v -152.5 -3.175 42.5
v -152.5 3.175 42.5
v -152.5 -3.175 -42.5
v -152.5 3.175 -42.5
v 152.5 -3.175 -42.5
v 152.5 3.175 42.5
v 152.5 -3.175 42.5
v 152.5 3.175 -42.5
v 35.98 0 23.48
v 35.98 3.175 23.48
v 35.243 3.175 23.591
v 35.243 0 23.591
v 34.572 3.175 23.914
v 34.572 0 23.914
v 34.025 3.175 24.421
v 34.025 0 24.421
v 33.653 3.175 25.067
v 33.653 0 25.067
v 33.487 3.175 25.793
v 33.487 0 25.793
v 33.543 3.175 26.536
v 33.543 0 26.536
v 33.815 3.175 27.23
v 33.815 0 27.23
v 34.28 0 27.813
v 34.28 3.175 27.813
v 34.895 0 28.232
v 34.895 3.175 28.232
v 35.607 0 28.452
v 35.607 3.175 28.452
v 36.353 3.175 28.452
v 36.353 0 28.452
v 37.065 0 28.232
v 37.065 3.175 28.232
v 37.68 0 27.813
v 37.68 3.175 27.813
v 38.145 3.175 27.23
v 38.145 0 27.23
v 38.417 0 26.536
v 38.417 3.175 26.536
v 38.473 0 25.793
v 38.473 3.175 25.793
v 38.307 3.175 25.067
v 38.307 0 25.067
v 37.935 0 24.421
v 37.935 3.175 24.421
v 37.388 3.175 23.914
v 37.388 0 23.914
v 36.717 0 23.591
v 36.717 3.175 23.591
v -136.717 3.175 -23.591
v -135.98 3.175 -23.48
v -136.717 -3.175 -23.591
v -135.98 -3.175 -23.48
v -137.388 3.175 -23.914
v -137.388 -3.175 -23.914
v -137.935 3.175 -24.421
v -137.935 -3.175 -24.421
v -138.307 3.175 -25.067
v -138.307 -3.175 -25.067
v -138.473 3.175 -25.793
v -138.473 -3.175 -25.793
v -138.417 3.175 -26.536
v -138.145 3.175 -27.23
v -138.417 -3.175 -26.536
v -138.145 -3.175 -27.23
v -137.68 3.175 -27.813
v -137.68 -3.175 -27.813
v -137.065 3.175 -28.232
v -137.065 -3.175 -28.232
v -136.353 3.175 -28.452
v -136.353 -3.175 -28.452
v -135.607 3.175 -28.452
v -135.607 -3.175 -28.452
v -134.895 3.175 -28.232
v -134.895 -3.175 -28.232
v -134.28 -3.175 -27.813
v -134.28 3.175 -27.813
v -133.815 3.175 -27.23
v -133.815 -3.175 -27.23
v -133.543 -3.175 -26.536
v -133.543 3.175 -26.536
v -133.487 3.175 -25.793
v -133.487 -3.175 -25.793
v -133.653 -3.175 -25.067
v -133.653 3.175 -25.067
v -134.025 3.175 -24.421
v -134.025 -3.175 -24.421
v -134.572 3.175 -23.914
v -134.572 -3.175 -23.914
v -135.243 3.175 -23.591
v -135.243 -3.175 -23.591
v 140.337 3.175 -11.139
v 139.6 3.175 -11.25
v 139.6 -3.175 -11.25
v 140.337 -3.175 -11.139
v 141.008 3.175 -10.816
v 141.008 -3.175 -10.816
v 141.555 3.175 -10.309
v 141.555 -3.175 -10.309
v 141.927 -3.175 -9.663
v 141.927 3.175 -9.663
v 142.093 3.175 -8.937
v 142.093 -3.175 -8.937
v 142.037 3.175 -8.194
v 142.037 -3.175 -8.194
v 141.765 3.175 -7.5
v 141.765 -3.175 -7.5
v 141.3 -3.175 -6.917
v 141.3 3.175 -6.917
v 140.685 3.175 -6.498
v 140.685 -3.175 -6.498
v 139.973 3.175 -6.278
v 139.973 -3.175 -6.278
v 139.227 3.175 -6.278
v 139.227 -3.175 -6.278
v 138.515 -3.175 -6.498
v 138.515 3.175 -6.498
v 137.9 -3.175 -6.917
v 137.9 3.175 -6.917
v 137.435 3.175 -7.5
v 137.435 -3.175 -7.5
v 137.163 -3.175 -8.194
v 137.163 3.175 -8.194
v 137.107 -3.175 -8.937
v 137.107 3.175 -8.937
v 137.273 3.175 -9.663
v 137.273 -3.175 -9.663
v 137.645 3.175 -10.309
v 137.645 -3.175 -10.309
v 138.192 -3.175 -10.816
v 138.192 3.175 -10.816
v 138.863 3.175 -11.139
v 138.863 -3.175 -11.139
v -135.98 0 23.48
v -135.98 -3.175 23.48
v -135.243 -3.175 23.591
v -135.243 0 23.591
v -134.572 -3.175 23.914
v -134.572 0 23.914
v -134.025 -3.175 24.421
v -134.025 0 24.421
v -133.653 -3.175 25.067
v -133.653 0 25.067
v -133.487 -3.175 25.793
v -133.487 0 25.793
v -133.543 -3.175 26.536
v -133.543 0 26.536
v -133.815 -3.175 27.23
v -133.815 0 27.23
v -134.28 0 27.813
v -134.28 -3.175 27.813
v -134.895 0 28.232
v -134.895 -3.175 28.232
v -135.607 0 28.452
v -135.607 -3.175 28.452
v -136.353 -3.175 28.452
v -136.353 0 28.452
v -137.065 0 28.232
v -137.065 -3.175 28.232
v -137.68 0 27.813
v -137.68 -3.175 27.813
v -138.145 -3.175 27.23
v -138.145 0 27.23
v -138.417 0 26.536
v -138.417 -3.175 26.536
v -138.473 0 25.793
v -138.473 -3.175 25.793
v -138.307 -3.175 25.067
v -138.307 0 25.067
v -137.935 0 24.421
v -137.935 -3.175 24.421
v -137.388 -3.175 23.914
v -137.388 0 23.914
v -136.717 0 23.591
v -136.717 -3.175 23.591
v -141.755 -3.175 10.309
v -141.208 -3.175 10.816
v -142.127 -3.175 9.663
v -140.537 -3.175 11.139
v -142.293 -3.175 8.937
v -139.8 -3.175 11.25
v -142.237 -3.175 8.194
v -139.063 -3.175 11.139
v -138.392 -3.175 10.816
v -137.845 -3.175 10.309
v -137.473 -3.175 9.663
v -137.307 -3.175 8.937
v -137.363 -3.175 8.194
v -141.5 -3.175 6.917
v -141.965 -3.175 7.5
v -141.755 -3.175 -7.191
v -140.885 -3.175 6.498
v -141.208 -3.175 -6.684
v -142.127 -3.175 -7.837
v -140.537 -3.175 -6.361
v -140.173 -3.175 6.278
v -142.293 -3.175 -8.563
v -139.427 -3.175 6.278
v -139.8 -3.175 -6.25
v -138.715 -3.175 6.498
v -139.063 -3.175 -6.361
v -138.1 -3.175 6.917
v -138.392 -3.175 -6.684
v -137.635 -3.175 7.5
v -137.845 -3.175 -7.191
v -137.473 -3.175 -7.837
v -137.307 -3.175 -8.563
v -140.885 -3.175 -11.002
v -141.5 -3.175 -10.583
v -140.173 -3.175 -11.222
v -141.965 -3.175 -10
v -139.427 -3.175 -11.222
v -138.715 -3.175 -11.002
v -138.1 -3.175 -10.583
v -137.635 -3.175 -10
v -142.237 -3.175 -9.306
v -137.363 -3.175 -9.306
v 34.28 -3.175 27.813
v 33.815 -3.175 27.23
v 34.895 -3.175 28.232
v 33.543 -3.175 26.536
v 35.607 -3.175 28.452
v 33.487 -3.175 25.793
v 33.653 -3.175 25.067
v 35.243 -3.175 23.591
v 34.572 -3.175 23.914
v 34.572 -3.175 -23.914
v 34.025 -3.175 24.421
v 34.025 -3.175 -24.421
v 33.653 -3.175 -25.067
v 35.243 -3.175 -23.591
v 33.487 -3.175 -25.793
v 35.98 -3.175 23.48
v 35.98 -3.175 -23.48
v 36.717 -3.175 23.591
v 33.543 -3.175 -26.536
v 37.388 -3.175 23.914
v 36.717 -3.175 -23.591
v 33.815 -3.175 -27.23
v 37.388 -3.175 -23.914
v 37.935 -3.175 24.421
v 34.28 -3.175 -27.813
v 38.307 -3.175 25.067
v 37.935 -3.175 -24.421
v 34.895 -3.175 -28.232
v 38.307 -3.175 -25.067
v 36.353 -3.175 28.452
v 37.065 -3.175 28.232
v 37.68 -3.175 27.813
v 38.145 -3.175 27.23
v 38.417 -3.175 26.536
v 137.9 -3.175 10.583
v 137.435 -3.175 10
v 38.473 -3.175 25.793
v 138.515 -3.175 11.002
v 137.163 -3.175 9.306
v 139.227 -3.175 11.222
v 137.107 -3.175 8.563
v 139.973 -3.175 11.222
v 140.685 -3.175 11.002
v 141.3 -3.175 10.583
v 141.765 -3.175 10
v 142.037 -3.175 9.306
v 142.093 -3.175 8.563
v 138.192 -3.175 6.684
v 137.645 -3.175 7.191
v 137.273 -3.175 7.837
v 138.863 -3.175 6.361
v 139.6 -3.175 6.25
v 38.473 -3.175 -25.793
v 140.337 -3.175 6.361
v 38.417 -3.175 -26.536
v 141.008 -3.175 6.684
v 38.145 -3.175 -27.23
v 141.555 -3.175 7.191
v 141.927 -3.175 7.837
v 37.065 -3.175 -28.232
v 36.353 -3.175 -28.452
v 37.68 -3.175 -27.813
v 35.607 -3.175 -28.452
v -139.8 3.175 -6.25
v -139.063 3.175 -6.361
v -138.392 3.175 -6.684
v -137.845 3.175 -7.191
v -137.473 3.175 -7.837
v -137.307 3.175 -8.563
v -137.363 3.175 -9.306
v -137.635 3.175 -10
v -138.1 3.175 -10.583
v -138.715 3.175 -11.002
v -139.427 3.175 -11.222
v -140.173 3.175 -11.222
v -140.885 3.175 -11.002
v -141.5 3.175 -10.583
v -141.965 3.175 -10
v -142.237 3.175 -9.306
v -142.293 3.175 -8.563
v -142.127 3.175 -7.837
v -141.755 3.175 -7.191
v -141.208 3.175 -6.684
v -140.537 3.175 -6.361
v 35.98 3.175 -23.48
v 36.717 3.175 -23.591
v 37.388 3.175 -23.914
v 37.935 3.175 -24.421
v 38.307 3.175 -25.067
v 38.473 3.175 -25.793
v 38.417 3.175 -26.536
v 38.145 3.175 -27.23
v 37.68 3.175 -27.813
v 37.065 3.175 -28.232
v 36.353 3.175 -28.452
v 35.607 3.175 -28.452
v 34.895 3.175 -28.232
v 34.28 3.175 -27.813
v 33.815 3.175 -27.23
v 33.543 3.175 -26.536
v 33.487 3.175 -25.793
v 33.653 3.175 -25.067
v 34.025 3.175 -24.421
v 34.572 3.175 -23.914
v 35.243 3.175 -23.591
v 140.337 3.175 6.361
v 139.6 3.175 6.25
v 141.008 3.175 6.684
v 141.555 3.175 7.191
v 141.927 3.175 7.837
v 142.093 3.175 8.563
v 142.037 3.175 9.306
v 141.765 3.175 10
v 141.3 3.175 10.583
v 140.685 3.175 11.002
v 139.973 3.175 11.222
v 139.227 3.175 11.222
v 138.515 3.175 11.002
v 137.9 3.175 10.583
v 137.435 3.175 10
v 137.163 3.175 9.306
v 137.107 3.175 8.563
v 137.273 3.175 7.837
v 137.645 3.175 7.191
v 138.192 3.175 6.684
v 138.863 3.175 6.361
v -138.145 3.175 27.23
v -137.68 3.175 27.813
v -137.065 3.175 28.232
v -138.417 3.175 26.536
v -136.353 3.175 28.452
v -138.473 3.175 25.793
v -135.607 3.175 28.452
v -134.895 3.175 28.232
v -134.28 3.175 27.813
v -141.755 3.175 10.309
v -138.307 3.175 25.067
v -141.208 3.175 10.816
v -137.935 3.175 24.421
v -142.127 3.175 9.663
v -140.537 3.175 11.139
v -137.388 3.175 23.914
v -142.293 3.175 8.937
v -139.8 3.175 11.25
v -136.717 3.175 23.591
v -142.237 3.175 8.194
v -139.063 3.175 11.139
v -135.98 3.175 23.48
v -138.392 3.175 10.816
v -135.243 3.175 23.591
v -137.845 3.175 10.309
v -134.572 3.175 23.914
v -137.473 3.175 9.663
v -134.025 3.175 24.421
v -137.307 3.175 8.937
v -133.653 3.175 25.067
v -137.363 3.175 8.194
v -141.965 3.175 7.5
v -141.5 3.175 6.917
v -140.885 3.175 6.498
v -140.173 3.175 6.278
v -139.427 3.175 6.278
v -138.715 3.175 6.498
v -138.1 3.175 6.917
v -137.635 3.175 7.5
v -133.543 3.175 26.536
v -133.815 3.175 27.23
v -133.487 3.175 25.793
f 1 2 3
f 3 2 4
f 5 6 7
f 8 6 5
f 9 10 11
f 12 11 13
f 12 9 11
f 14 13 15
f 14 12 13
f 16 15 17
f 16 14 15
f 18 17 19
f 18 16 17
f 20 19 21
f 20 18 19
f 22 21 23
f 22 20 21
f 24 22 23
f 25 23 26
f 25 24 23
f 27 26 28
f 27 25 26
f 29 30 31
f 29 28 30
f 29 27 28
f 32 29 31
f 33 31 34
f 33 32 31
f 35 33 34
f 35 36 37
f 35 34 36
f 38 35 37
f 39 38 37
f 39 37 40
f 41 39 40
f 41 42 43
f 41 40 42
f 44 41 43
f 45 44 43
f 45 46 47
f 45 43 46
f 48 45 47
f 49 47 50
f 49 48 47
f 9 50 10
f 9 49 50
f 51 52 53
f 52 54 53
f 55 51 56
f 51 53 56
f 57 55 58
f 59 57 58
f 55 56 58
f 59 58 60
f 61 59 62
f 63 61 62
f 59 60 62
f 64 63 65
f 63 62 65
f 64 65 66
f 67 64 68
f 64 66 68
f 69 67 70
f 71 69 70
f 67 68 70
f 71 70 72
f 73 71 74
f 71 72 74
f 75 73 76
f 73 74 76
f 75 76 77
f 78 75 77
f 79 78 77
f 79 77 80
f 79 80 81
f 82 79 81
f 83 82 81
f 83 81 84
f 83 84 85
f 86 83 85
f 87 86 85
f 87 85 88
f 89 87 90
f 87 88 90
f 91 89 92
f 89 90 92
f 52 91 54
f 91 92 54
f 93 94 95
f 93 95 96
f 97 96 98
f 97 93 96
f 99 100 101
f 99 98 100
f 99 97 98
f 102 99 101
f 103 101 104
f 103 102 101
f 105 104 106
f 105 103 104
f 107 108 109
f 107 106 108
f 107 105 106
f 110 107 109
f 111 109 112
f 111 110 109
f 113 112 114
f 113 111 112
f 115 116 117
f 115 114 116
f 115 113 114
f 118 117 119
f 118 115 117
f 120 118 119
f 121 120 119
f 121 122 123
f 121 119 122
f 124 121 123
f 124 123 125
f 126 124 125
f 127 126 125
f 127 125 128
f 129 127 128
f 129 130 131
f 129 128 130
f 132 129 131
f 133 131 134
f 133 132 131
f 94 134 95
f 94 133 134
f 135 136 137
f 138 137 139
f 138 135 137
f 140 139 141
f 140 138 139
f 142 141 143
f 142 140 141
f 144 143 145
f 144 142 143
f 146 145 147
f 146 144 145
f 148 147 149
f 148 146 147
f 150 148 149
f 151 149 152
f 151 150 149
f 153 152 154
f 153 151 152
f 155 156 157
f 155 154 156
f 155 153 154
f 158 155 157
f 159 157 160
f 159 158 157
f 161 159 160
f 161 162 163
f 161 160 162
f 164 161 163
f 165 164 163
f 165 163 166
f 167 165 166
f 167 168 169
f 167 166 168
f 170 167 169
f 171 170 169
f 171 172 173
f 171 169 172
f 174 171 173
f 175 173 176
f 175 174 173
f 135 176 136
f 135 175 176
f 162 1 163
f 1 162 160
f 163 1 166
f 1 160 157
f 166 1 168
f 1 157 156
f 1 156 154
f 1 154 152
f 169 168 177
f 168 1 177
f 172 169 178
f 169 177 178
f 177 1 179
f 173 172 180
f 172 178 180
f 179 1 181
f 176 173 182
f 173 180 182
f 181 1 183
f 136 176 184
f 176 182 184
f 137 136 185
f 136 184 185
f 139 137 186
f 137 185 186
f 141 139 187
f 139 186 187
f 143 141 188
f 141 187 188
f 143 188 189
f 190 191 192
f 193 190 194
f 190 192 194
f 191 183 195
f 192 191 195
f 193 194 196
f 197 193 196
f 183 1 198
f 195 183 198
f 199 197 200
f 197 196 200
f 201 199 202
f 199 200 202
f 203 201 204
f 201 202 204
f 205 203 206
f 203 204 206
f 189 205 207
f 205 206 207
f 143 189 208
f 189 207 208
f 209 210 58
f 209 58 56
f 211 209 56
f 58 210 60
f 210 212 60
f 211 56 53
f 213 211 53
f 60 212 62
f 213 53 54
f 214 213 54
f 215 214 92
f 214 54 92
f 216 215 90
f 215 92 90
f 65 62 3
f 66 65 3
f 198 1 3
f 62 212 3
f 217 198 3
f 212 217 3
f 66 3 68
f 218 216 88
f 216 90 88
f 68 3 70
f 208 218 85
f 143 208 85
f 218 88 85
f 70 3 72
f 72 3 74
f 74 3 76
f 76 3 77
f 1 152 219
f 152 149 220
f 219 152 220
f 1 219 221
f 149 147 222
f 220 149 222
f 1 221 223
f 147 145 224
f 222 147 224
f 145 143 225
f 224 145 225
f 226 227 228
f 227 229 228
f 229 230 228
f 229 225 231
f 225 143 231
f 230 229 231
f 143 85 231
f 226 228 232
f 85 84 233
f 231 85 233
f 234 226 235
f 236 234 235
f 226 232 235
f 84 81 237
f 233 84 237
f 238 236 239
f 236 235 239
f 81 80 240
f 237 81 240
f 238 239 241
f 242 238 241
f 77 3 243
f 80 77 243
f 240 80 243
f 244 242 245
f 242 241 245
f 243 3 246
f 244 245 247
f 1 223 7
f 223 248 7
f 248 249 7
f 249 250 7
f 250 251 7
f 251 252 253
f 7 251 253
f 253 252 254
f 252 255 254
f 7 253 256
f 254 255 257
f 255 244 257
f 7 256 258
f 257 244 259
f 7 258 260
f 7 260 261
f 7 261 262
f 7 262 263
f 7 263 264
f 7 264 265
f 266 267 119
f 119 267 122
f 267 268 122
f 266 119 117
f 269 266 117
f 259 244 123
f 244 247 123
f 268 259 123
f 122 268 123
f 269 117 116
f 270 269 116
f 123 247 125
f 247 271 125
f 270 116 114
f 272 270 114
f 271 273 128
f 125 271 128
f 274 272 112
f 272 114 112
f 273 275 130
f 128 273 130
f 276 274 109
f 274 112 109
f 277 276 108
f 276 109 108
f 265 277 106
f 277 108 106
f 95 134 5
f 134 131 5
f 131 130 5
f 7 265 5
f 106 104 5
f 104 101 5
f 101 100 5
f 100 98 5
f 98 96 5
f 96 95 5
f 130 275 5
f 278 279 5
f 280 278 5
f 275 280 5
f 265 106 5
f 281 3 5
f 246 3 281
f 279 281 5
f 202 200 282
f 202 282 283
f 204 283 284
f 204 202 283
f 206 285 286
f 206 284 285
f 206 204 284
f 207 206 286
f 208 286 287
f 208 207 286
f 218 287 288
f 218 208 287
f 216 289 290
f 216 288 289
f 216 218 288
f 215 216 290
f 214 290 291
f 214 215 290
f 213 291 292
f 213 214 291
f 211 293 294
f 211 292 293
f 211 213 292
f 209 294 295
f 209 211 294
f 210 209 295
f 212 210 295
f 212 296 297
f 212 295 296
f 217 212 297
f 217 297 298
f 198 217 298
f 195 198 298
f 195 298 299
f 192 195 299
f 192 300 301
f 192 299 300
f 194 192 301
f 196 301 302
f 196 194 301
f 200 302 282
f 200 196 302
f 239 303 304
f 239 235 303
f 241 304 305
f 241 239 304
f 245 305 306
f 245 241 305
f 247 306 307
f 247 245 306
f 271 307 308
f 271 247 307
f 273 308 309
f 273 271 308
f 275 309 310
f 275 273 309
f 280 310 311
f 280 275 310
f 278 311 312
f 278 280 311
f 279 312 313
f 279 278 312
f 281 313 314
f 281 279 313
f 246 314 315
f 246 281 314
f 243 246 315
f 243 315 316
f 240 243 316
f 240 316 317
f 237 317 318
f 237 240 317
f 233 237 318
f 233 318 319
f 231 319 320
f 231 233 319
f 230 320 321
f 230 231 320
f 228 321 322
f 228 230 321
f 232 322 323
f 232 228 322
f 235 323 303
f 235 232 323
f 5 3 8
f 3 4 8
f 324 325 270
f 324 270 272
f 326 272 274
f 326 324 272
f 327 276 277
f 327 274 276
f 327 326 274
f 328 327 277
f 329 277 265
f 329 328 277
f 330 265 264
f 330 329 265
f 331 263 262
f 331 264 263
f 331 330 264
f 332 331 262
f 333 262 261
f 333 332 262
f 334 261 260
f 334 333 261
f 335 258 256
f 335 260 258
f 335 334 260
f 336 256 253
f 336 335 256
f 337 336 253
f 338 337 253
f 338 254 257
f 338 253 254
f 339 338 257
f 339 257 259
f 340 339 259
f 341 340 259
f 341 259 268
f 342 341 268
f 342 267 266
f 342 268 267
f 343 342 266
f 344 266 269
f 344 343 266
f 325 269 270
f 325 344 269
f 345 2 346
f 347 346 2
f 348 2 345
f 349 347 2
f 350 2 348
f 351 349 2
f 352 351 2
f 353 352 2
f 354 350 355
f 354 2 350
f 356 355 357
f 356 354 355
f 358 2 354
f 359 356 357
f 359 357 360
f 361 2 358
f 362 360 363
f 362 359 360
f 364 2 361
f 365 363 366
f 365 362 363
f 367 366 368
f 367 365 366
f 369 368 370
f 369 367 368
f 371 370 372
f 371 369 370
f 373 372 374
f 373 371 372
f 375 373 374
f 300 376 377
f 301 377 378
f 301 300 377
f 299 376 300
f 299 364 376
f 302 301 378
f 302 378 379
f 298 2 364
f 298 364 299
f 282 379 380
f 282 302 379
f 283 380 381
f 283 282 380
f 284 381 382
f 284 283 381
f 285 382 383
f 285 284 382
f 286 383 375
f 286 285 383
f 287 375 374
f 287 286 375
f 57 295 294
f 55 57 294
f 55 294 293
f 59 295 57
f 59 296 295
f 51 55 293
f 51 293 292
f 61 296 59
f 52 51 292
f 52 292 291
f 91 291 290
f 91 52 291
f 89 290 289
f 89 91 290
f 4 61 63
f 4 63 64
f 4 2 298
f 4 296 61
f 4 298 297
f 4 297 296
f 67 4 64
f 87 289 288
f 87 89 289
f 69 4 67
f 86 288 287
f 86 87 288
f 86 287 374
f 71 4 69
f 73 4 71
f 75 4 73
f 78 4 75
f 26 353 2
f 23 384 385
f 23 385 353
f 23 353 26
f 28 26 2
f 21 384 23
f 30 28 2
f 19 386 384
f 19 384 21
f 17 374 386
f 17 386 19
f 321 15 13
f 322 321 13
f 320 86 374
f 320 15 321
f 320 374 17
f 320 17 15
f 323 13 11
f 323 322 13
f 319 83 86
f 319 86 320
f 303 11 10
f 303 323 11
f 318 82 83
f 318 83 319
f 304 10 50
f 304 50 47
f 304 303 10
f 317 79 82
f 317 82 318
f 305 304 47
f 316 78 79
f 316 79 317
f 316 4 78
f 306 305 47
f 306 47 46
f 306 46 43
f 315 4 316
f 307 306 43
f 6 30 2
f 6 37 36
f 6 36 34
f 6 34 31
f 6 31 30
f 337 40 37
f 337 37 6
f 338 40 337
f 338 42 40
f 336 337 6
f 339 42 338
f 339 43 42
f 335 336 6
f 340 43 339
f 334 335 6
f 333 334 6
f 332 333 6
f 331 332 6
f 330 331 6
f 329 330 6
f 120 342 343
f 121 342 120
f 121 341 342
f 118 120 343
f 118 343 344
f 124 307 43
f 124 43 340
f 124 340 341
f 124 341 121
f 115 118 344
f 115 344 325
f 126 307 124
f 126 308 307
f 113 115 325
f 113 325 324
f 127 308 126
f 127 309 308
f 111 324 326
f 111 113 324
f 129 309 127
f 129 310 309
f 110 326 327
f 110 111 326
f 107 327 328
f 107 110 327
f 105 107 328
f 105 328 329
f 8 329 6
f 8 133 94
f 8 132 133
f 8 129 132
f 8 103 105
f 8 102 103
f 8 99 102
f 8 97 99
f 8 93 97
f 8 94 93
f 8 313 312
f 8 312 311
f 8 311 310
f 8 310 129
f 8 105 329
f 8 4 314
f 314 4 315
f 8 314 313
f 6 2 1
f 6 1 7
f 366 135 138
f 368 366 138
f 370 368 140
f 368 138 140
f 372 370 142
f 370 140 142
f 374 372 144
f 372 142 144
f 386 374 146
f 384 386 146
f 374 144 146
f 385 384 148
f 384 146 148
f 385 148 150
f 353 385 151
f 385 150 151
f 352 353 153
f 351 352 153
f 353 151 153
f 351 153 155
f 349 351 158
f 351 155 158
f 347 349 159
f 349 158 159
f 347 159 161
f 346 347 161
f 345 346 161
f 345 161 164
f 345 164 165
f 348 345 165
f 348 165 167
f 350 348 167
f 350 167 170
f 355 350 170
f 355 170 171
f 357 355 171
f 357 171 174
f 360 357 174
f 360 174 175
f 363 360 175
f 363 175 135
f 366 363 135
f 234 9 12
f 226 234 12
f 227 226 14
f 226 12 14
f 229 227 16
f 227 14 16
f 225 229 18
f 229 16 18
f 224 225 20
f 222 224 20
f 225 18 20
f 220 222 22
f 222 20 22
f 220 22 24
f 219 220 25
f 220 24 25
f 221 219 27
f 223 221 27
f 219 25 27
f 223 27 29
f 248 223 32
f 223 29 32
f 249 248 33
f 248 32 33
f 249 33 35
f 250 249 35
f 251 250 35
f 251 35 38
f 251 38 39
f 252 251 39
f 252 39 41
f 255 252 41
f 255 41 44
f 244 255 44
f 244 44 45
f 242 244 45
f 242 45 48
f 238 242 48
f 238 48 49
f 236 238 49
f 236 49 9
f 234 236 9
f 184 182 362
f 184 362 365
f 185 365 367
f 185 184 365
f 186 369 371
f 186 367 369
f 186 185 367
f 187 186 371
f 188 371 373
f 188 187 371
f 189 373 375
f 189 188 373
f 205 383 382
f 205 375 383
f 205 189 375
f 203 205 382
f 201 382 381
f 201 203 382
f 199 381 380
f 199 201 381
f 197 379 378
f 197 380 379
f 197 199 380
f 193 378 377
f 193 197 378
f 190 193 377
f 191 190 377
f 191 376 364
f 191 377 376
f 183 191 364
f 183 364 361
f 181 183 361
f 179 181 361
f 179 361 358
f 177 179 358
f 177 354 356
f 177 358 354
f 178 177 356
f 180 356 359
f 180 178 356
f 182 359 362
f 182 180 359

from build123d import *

# Parameters (mm, degrees)
SKETCH1_W               = 305
SKETCH1_H               = 85
BOSS_EXTRUDE1_DEPTH     = 3.175
SKETCH4_R               = 2.5
CUT_EXTRUDE2_DEPTH      = 161.752389174
CUT_EXTRUDE3_DEPTH      = 159.438702658
CUT_EXTRUDE3_DEPTH_BACK = 159.438702658
SKETCH6_R               = 2.5
CUT_EXTRUDE4_DEPTH      = 159.438702658
CUT_EXTRUDE4_DEPTH_BACK = 159.438702658
SKETCH7_R               = 2.5


with BuildPart() as part:
    # Sketch1 → Boss-Extrude1 (new, symmetric)
    with BuildSketch(Plane(origin=(0, 0, 0), x_dir=(1, 0, 0), z_dir=(0, 1, 0))):
        Rectangle(SKETCH1_W, SKETCH1_H)
    extrude(amount=BOSS_EXTRUDE1_DEPTH, both=True)

    # Sketch4 → Cut-Extrude2 (cut, symmetric)
    with BuildSketch(Plane(origin=(-2.5, 0, 0), x_dir=(-1, 0, 0), z_dir=(0, -1, 0))):
        with Locations(Location((133.48, -25.98, 0), (0, 0, 90))):
            Circle(SKETCH4_R)
        with Locations(Location((133.48, 25.98, 0), (0, 0, 270))):
            Circle(SKETCH4_R)
    cut_extrude2 = extrude(amount=CUT_EXTRUDE2_DEPTH, both=True, mode=Mode.SUBTRACT)

    # Mirror2: Cut-Extrude2 across plane
    add(cut_extrude2.mirror(Plane.ZY.offset(50)), mode=Mode.SUBTRACT)

    # Sketch6 → Cut-Extrude3 (cut, two sides: drawn at the far end of the back side and taken through both)
    with BuildSketch(Plane(origin=(0, 3.175, 0), x_dir=(1, 0, 0), z_dir=(0, 1, 0)).offset(-CUT_EXTRUDE3_DEPTH_BACK)):
        with Locations(Location((-139.8, 8.75, 0), (0, 0, 270))):
            Circle(SKETCH6_R)
        with Locations(Location((-139.8, -8.75, 0), (0, 0, 270))):
            Circle(SKETCH6_R)
    extrude(amount=CUT_EXTRUDE3_DEPTH + CUT_EXTRUDE3_DEPTH_BACK, mode=Mode.SUBTRACT)

    # Sketch7 → Cut-Extrude4 (cut, two sides: drawn at the far end of the back side and taken through both)
    with BuildSketch(Plane.XZ.offset(3.175).offset(-CUT_EXTRUDE4_DEPTH_BACK)):
        with Locations(Location((139.6, -8.75, 0), (0, 0, 270))):
            Circle(SKETCH7_R)
        with Locations(Location((139.6, 8.75, 0), (0, 0, 270))):
            Circle(SKETCH7_R)
    extrude(amount=CUT_EXTRUDE4_DEPTH + CUT_EXTRUDE4_DEPTH_BACK, mode=Mode.SUBTRACT)


solid = part.part
